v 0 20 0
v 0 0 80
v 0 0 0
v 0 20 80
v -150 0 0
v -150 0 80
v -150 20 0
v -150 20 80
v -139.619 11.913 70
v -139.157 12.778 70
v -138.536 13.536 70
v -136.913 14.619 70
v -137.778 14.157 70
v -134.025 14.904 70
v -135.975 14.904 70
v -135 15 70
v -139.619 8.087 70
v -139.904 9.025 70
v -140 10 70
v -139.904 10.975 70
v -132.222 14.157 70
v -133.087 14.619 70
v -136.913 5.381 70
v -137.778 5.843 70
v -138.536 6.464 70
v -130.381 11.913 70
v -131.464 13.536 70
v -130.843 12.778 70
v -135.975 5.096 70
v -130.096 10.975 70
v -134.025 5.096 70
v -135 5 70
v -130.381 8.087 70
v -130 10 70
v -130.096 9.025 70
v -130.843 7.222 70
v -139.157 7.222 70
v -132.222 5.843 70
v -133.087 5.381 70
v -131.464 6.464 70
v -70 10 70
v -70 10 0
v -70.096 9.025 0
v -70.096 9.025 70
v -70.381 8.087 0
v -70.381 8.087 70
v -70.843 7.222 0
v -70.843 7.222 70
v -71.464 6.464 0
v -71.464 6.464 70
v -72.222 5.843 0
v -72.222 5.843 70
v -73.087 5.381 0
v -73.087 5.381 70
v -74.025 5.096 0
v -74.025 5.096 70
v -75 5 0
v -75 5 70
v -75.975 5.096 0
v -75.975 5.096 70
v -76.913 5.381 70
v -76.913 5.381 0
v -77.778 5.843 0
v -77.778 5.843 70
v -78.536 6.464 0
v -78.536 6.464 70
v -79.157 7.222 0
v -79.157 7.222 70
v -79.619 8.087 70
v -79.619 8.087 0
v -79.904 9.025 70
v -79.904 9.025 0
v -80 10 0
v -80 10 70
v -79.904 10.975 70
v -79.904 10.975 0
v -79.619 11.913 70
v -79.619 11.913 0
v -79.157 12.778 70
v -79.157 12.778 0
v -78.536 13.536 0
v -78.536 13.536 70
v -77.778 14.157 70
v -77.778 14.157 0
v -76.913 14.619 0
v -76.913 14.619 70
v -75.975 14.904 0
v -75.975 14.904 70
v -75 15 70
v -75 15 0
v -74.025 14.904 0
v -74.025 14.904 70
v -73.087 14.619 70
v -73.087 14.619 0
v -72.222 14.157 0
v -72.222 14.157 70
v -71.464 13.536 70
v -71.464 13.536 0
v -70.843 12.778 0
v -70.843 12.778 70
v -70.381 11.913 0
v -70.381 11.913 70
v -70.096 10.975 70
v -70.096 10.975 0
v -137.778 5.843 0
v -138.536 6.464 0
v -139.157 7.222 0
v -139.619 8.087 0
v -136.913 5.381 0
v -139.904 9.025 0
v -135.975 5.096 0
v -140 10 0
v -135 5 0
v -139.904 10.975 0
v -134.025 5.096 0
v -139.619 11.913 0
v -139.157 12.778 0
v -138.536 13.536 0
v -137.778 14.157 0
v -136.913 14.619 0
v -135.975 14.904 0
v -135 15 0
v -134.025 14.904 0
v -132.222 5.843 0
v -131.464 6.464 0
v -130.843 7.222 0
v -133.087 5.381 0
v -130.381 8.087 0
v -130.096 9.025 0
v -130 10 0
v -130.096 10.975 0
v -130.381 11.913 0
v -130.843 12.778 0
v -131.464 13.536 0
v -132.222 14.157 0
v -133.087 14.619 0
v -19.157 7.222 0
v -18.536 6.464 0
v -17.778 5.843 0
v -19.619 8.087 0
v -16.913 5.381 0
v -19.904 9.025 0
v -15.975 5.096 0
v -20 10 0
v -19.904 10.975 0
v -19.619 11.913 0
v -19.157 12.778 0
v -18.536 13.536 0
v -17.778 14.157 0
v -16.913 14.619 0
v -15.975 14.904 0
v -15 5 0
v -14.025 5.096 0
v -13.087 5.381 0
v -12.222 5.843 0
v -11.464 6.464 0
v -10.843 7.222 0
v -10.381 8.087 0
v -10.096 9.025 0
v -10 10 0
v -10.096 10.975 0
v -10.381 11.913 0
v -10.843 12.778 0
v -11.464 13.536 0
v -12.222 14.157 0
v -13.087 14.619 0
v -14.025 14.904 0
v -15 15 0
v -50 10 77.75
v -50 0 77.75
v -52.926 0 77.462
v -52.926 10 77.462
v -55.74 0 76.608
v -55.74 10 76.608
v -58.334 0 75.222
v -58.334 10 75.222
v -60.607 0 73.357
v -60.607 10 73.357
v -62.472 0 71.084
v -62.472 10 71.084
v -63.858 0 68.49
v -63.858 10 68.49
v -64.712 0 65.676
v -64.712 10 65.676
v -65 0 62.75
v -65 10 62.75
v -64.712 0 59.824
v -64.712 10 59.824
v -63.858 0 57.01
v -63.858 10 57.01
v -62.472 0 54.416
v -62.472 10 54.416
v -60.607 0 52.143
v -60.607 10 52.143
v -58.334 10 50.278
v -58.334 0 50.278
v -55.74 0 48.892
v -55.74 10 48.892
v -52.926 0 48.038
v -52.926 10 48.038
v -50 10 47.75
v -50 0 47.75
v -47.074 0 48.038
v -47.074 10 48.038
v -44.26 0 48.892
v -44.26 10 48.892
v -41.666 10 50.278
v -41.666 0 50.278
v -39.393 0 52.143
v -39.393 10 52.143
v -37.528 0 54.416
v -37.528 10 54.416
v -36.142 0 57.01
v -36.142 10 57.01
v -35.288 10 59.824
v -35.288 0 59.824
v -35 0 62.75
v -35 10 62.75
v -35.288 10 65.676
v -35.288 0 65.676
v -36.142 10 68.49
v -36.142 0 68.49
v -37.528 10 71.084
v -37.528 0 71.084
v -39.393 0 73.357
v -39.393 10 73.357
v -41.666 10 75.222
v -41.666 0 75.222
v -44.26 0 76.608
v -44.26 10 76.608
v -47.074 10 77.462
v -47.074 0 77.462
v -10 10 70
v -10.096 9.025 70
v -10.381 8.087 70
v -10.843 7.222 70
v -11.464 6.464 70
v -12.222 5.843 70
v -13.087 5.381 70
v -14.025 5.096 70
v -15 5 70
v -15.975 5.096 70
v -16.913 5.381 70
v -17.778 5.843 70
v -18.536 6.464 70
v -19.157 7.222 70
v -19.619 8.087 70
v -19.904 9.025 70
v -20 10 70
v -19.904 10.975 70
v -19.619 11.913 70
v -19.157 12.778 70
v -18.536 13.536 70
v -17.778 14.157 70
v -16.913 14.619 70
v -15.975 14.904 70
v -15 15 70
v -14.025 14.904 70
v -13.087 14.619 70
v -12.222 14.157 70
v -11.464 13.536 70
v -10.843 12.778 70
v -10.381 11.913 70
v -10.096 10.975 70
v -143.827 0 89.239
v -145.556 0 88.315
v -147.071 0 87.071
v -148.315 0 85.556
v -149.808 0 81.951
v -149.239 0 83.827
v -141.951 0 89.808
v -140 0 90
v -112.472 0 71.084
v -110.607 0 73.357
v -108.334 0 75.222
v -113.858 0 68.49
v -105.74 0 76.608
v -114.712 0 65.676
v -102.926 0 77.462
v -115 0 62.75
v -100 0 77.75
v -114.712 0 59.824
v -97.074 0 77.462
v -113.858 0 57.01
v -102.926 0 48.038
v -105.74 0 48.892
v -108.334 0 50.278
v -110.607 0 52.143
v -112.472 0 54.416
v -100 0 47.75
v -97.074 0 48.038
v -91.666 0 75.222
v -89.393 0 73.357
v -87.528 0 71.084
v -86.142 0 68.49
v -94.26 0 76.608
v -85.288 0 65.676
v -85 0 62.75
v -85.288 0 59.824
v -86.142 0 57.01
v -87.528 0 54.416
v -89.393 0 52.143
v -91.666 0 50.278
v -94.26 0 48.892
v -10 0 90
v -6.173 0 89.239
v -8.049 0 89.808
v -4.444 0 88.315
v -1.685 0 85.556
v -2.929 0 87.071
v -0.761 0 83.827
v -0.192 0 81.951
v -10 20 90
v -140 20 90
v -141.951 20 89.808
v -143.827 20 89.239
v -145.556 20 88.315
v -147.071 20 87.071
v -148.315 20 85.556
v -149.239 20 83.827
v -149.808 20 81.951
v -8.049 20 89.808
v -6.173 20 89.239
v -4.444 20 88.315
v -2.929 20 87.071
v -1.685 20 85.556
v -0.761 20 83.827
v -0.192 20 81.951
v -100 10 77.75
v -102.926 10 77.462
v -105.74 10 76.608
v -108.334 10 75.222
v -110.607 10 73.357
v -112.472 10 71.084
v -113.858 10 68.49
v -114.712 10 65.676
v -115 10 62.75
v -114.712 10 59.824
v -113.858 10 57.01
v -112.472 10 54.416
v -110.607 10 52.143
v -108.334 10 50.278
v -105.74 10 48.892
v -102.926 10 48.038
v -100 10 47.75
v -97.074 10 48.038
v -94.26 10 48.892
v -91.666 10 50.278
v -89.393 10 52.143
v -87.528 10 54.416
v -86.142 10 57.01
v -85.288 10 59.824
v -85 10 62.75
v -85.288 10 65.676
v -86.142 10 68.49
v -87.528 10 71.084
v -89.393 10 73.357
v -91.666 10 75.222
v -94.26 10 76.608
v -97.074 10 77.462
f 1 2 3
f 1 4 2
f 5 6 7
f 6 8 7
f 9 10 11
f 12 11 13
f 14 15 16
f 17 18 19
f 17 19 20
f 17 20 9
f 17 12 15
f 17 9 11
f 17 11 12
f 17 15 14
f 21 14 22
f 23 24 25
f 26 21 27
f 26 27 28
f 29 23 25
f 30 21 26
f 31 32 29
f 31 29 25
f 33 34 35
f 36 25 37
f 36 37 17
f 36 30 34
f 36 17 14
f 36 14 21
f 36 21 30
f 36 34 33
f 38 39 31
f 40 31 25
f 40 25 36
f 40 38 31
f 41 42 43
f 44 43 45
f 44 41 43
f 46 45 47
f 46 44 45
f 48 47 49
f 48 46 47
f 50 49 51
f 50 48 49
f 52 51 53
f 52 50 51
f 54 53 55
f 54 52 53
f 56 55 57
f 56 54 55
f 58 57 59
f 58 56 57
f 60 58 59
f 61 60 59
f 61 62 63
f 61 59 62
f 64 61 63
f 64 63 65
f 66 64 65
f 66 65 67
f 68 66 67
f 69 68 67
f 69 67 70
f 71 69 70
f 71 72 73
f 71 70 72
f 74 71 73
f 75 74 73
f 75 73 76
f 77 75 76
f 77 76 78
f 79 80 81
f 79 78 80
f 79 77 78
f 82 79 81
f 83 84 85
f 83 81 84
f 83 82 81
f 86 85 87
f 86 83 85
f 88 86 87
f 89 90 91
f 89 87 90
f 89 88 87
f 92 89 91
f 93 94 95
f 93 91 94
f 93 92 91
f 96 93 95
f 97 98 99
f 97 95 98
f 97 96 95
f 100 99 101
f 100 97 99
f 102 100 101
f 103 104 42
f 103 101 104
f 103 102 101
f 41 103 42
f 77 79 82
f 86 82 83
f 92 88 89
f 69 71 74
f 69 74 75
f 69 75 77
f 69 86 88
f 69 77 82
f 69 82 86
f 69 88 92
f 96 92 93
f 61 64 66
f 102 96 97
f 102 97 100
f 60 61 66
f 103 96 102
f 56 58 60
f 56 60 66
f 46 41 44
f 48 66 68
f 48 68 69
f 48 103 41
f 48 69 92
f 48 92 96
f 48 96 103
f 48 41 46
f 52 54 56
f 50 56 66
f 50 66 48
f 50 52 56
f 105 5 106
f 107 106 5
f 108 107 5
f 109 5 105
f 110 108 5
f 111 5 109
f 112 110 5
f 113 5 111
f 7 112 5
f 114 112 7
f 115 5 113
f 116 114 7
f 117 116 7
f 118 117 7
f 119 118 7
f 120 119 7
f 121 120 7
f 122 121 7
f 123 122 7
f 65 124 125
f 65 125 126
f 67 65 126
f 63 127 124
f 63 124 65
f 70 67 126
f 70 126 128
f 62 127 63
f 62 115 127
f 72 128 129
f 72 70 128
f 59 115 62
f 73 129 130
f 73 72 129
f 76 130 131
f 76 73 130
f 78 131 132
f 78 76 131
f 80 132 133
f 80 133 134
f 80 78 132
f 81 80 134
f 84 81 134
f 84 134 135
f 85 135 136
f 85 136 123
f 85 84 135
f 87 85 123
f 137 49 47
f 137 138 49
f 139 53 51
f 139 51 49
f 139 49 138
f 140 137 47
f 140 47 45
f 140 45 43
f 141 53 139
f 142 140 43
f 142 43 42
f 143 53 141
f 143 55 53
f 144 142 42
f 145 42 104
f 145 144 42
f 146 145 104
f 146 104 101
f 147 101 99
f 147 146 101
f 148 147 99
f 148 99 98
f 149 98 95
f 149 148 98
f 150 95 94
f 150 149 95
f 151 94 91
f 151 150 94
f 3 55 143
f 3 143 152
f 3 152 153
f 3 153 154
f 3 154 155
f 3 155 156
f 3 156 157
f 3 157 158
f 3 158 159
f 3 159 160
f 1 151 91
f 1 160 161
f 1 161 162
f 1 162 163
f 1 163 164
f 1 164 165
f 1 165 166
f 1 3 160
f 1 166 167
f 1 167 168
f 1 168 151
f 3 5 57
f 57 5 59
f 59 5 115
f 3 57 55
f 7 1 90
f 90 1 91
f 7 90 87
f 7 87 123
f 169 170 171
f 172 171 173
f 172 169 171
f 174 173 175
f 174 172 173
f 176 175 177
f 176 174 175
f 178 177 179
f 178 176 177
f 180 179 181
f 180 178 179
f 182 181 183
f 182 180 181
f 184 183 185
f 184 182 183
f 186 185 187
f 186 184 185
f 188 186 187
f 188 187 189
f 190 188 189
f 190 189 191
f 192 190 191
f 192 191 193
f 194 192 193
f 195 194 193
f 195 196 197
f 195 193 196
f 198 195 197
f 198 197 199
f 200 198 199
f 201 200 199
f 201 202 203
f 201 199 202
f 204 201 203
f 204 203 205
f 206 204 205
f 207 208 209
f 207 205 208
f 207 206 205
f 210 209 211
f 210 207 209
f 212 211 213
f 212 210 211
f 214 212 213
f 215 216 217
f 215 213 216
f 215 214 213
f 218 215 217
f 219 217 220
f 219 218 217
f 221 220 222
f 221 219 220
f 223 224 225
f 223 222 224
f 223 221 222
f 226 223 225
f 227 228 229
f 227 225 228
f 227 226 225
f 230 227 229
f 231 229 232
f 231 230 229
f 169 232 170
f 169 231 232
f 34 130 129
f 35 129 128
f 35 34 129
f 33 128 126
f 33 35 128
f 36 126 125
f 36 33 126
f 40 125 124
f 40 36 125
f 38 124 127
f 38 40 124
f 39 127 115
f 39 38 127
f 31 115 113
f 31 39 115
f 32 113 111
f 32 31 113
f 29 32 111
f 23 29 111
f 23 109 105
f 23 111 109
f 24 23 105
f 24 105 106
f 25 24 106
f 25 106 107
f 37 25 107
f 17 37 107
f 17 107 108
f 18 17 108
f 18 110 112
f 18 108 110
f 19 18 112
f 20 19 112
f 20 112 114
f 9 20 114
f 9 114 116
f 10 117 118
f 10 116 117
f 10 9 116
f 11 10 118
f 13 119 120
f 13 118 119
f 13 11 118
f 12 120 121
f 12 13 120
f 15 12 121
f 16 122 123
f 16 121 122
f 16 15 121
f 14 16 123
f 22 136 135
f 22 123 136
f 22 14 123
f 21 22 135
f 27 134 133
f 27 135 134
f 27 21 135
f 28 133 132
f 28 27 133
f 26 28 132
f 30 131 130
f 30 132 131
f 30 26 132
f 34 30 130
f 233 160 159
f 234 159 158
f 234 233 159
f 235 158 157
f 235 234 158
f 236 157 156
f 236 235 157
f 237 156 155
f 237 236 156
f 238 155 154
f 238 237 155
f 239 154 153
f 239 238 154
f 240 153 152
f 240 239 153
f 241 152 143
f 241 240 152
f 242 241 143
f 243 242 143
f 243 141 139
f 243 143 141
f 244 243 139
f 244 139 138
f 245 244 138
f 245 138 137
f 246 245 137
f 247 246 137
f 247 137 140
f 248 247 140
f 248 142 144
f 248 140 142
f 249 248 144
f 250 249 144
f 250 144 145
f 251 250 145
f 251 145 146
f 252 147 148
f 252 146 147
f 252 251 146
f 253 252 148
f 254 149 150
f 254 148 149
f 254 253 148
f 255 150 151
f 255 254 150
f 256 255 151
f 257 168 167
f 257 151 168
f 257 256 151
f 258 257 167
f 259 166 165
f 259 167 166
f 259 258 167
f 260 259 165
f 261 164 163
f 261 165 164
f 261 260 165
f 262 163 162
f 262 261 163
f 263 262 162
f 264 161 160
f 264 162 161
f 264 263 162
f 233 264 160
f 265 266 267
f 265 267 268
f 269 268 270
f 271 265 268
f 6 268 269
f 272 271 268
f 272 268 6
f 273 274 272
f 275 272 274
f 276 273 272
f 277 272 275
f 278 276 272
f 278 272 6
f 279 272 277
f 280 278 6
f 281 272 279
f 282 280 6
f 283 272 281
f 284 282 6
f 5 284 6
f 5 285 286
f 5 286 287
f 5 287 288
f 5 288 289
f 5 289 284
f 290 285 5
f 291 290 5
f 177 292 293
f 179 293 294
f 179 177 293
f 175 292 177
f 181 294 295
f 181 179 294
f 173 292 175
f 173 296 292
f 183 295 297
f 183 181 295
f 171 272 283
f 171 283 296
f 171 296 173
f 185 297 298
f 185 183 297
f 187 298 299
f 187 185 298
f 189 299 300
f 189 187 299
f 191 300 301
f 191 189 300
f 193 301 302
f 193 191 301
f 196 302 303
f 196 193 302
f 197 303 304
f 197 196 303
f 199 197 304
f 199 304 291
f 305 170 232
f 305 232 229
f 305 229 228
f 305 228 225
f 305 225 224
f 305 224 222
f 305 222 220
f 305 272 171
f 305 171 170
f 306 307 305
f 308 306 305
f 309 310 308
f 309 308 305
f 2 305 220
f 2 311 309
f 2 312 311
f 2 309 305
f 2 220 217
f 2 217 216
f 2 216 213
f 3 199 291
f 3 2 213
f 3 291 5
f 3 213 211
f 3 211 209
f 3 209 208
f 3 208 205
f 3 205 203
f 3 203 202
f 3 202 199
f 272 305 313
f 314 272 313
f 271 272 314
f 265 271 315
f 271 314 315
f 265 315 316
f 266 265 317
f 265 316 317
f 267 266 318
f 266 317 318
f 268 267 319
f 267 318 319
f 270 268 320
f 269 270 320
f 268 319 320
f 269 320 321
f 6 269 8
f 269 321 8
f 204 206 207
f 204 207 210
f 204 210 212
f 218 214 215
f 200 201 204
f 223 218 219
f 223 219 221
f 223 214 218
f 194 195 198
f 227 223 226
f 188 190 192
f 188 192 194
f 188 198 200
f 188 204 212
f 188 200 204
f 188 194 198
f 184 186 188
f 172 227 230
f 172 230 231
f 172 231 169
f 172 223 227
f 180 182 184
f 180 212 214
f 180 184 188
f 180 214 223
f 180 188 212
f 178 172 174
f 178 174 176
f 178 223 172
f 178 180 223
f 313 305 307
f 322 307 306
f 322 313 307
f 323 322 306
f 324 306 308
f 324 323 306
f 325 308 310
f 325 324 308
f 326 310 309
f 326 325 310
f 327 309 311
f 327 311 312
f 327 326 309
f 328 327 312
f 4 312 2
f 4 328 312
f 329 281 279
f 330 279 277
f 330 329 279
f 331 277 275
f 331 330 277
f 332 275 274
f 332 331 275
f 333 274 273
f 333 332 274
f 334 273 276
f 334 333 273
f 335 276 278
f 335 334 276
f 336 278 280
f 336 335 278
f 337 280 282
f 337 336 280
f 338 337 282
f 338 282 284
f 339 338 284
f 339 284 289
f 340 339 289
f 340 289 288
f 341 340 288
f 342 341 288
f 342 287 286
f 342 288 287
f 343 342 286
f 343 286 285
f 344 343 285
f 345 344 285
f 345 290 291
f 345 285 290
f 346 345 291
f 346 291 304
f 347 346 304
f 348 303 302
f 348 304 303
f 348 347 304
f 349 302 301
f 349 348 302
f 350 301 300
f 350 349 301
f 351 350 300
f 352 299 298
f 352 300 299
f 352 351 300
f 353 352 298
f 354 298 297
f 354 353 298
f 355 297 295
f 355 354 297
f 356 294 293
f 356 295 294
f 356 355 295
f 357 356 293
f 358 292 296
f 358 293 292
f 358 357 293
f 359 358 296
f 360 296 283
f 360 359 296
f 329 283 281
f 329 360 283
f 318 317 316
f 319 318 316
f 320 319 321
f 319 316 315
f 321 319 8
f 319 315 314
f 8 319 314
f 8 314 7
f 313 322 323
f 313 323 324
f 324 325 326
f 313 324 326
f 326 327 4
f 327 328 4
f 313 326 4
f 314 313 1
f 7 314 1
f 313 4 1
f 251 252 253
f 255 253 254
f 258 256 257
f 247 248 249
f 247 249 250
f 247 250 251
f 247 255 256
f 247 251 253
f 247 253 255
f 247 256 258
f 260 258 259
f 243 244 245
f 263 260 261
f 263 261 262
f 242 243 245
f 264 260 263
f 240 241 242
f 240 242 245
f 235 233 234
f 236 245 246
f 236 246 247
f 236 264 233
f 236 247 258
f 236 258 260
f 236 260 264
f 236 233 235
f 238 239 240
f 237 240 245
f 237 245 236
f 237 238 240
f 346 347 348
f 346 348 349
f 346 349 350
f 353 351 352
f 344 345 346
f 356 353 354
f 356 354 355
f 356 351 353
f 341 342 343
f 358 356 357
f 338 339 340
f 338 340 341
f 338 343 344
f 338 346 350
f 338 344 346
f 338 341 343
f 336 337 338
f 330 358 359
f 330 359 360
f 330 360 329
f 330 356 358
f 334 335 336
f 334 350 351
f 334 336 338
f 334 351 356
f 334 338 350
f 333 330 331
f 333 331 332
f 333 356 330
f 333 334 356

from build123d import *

# Parameters (mm, degrees)
SKETCH1_W               = 90
SKETCH1_H               = 20
BOSS_EXTRUDE1_DEPTH     = 150
CUT_EXTRUDE1_DEPTH      = 177.068168617
CUT_EXTRUDE1_DEPTH_BACK = 10
SKETCH2_R               = 15
CUT_EXTRUDE3_DEPTH      = 177.068168617
CUT_EXTRUDE3_DEPTH_BACK = 70
SKETCH4_R               = 5
FILLET1_R               = 10


with BuildPart() as part:
    # Sketch1 → Boss-Extrude1 (new body)
    with BuildSketch(Plane(origin=(0, 0, 0), x_dir=(0, 0, -1), z_dir=(1, 0, 0))):
        with Locations((-45, 10)):
            Rectangle(SKETCH1_W, SKETCH1_H)
    extrude(amount=-BOSS_EXTRUDE1_DEPTH)

    # Sketch2 → Cut-Extrude1 (cut, two sides: drawn at the far end of the back side and taken through both)
    with BuildSketch(Plane.XZ.offset(-CUT_EXTRUDE1_DEPTH_BACK)):
        with Locations(Location((-50, 62.75, 0), (0, 0, 90))):
            Circle(SKETCH2_R)
        with Locations(Location((-100, 62.75, 0), (0, 0, 90))):
            Circle(SKETCH2_R)
    extrude(amount=CUT_EXTRUDE1_DEPTH + CUT_EXTRUDE1_DEPTH_BACK, mode=Mode.SUBTRACT)

    # Sketch4 → Cut-Extrude3 (cut, two sides: drawn at the far end of the back side and taken through both)
    with BuildSketch(Plane(origin=(0, 0, 0), x_dir=(-1, 0, 0), z_dir=(0, 0, -1)).offset(-CUT_EXTRUDE3_DEPTH_BACK)):
        with Locations(Location((15, 10, 0), (0, 0, 180))):
            Circle(SKETCH4_R)
        with Locations(Location((75, 10, 0), (0, 0, 180))):
            Circle(SKETCH4_R)
        with Locations(Location((135, 10, 0), (0, 0, 180))):
            Circle(SKETCH4_R)
    extrude(amount=CUT_EXTRUDE3_DEPTH + CUT_EXTRUDE3_DEPTH_BACK, mode=Mode.SUBTRACT)

    # Fillet1
    fillet1_edges = [part.edges().sort_by_distance(p)[0] for p in [
        (-150, 10, 90),
        (0, 10, 90),
    ]]
    fillet(fillet1_edges, radius=FILLET1_R)


solid = part.part
